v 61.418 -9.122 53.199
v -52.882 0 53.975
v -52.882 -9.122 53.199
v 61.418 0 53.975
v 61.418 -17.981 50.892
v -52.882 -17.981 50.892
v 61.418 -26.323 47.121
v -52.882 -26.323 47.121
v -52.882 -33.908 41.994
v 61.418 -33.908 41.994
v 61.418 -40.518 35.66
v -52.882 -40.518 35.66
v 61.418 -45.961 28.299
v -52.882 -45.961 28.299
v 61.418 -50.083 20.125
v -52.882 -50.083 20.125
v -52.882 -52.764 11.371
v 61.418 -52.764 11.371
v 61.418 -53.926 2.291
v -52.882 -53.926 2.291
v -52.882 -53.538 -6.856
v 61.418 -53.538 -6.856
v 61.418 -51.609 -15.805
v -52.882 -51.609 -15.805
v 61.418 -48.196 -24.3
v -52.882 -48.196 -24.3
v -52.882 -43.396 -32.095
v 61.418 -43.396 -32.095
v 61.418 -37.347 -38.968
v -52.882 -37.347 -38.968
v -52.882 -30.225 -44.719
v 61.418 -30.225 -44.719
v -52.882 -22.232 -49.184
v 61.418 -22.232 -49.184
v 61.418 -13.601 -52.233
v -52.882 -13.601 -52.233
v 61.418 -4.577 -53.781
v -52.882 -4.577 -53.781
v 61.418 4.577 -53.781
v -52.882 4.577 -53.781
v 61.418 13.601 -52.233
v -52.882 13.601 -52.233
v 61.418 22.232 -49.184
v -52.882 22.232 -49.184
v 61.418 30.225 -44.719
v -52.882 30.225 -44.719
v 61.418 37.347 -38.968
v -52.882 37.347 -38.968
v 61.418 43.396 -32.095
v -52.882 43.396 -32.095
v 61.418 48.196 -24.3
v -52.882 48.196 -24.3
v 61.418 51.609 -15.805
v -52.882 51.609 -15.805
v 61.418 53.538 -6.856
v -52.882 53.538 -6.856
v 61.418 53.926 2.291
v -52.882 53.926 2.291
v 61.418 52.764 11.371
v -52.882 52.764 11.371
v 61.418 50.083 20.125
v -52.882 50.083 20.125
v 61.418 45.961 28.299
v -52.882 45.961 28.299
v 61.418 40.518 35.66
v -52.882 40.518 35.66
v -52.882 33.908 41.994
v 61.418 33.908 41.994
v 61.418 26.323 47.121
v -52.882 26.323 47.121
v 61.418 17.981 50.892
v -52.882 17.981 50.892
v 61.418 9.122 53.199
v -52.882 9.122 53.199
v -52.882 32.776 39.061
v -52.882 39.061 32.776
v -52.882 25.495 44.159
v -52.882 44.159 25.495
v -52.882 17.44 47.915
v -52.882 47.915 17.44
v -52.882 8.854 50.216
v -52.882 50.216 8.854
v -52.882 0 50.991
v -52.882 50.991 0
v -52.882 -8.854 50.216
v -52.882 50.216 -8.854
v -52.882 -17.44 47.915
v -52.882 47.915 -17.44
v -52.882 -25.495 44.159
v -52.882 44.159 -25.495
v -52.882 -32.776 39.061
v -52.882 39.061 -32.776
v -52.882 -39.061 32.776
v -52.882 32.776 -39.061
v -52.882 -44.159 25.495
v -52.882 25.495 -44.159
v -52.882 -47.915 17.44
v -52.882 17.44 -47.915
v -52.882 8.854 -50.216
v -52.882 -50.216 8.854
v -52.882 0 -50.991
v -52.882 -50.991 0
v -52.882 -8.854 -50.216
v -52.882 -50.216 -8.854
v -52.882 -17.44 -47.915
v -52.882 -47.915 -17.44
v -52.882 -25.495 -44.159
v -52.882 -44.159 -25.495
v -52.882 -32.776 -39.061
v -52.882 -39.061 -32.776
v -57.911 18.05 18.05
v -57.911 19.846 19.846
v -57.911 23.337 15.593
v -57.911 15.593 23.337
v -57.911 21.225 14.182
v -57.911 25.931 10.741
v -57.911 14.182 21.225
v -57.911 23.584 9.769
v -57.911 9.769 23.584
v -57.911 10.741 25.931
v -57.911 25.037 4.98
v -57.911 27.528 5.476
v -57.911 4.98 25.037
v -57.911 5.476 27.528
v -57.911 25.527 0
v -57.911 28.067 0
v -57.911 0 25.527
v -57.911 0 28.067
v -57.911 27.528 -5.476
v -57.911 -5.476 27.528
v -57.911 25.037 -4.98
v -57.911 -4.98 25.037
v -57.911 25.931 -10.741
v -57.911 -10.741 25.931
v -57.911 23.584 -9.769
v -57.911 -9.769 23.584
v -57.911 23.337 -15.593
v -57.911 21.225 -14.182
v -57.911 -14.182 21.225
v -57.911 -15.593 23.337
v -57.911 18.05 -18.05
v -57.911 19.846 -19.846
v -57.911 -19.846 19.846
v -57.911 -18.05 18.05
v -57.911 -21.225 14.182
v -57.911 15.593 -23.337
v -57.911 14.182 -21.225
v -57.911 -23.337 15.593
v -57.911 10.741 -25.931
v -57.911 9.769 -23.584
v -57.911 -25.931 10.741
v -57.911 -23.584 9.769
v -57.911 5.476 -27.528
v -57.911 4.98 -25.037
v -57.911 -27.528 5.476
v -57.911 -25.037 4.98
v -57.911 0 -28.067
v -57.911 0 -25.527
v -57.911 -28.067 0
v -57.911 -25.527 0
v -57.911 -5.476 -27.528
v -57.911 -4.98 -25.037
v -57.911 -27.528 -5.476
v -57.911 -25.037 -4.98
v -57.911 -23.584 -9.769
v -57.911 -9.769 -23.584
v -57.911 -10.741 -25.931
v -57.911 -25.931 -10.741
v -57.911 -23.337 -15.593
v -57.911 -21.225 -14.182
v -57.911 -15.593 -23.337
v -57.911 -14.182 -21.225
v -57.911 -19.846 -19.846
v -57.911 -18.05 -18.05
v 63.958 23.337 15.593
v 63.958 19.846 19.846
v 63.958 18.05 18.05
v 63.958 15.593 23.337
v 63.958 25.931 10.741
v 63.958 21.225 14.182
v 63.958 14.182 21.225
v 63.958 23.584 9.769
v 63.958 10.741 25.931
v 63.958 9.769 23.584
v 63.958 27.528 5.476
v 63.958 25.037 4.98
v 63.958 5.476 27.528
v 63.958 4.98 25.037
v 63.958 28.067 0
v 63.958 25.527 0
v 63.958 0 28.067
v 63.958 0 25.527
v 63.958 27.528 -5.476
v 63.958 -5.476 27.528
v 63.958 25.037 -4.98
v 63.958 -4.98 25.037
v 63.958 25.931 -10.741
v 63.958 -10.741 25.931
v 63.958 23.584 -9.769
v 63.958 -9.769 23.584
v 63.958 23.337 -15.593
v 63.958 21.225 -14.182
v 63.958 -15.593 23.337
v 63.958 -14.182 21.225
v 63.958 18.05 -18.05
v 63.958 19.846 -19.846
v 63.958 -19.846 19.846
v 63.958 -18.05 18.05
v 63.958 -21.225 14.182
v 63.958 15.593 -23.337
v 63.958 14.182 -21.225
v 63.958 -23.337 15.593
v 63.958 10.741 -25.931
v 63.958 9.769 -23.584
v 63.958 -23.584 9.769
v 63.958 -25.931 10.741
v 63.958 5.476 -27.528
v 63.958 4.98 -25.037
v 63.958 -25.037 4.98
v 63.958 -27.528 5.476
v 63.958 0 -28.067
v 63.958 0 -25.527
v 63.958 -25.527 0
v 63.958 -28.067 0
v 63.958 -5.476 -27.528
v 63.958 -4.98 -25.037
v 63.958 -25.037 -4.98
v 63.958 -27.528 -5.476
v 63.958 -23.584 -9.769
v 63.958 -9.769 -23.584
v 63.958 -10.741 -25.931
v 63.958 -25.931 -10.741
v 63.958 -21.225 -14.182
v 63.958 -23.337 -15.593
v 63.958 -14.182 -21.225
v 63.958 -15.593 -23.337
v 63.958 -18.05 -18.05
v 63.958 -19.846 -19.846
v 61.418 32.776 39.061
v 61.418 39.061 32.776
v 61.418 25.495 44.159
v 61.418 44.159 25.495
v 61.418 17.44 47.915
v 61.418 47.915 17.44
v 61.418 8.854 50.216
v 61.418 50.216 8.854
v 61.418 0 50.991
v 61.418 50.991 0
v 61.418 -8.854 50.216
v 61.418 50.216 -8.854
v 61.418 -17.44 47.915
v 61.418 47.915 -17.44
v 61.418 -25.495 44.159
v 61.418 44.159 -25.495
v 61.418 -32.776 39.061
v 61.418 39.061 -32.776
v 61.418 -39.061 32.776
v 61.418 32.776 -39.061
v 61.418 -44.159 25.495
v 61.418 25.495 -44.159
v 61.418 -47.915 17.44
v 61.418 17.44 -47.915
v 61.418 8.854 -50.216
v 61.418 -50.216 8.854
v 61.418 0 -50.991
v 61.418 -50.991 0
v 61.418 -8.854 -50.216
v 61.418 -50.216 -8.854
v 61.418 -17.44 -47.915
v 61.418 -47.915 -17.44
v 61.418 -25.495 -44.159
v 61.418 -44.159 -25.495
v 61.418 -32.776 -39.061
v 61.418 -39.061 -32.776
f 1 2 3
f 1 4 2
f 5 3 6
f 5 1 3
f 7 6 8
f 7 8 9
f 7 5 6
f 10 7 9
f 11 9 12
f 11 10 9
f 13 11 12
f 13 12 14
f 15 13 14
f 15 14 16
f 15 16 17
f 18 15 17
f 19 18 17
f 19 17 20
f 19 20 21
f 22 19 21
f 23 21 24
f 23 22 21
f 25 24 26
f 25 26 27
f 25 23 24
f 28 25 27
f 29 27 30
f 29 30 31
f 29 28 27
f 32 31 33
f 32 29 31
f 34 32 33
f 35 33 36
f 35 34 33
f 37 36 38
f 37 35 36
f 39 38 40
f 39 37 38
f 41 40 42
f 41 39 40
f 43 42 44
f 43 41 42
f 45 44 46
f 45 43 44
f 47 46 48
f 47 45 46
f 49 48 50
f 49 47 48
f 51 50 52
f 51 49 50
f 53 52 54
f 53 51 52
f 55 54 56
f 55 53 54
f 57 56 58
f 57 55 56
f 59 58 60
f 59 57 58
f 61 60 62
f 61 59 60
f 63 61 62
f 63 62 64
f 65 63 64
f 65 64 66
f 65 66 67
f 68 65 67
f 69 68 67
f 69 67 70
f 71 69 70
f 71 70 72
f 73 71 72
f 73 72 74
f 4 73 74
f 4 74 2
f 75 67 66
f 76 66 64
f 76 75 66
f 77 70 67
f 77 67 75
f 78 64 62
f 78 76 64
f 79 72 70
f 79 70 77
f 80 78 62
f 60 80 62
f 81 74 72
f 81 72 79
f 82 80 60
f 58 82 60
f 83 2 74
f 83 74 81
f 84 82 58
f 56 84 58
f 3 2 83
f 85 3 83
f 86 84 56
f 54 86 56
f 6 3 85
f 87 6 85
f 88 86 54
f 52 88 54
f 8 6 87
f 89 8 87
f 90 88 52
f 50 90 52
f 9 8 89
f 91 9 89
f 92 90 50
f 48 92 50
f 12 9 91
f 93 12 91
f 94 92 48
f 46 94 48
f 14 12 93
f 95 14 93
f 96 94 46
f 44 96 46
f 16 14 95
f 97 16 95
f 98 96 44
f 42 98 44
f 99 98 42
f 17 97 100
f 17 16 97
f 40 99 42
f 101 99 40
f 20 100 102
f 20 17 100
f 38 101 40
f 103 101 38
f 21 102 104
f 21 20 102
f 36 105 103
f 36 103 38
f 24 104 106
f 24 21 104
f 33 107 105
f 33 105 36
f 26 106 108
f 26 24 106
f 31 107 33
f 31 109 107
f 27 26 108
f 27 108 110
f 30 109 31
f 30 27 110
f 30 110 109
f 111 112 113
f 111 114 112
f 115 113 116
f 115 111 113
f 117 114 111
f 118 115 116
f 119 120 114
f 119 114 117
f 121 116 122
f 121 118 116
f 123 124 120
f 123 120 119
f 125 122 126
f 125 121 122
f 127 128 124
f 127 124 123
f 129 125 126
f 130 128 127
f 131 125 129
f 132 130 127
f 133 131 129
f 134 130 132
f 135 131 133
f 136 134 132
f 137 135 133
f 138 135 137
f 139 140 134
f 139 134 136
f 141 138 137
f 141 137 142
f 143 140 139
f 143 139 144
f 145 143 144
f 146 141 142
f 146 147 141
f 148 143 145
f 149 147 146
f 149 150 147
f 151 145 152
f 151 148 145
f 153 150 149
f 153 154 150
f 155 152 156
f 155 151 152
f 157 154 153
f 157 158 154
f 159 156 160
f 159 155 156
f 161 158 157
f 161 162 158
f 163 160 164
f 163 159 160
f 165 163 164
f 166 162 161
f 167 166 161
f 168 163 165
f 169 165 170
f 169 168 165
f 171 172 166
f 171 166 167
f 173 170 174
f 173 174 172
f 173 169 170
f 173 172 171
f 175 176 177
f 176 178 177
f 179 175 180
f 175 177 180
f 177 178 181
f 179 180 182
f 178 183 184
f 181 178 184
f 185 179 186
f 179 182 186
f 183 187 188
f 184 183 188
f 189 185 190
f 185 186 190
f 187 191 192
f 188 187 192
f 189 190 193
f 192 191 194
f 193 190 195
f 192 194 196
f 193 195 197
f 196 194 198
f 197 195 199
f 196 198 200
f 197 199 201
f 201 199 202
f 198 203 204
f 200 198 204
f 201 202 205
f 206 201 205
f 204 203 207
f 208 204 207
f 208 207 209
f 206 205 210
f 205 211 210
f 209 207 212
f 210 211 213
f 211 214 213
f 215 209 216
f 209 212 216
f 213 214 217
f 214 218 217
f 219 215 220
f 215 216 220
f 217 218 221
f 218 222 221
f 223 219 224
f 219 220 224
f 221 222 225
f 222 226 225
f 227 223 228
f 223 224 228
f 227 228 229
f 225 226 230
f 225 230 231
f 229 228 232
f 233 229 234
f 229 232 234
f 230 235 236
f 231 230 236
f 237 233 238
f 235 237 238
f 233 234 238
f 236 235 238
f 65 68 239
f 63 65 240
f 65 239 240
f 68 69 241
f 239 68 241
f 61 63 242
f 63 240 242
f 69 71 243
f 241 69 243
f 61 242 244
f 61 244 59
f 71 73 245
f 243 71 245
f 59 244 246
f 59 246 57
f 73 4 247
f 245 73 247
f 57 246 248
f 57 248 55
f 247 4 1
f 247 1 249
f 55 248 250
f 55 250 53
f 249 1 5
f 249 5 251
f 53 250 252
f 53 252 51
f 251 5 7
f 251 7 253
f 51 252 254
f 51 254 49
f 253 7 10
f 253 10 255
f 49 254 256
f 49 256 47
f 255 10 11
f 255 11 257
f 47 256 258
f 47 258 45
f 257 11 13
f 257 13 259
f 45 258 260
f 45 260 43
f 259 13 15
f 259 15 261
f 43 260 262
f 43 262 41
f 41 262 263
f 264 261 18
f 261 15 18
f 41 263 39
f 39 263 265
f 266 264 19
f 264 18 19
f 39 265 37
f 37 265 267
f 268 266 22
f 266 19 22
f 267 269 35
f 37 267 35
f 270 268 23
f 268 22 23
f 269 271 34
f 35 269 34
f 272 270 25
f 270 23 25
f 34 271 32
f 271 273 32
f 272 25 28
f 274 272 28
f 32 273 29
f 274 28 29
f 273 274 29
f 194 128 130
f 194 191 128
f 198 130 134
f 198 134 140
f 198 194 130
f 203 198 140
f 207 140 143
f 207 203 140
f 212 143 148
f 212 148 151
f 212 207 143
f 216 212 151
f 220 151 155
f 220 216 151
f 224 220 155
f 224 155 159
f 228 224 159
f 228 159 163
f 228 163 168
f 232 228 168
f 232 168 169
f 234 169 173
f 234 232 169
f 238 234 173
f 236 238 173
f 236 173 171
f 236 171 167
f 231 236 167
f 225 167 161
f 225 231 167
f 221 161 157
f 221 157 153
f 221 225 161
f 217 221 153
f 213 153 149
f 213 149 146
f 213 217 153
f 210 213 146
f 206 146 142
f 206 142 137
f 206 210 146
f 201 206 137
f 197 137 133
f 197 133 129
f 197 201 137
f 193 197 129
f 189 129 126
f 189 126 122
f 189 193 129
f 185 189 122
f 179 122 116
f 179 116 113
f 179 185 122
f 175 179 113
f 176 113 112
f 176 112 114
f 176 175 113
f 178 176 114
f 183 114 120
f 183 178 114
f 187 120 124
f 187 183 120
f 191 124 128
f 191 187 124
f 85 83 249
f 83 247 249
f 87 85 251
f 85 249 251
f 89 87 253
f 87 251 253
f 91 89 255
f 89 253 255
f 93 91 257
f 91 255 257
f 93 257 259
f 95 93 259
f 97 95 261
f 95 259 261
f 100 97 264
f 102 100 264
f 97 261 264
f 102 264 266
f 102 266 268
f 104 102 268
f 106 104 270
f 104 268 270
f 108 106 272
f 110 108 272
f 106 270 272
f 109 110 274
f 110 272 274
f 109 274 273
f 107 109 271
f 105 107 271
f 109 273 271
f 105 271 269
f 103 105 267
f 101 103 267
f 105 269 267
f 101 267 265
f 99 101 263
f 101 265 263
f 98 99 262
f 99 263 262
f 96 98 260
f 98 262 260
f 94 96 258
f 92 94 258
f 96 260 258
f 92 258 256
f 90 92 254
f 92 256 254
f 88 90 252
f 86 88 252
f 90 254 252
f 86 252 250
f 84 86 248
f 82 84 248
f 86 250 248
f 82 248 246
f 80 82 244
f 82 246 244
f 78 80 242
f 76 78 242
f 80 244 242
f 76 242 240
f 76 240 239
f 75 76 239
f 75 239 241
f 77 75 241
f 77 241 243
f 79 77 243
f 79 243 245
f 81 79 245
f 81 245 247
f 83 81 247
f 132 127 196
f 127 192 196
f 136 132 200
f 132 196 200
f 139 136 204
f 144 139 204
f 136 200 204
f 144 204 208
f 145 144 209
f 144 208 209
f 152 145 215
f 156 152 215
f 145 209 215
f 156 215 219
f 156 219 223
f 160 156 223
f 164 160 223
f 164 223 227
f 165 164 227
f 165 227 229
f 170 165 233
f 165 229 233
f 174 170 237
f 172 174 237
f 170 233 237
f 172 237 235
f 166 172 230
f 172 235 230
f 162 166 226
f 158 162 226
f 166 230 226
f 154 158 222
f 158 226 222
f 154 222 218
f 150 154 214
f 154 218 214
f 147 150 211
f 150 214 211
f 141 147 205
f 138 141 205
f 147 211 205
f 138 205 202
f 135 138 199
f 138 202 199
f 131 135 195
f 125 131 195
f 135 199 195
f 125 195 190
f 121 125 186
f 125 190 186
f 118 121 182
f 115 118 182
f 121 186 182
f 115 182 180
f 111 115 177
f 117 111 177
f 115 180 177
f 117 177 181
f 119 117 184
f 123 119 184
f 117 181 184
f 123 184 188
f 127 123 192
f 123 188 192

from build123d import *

# Parameters (mm, degrees)
SKETCH2_W   = 121.8692
SKETCH2_H   = 2.54
SKETCH2_W_2 = 114.3
SKETCH2_H_2 = 2.9845


with BuildPart() as part:
    # Sketch2 → Revolve1 (revolve)
    with BuildSketch(Plane.XY, mode=Mode.PRIVATE) as revolve1_sk:
        with Locations((3.023472735, 26.797)):
            Rectangle(SKETCH2_W, SKETCH2_H)
        with Locations((4.268072735, 52.48275)):
            Rectangle(SKETCH2_W_2, SKETCH2_H_2)
    revolve(revolve1_sk.sketch.rotate(Axis((0, 0, 0), (1, 0, 0)), 90), axis=Axis((0, 0, 0), (1, 0, 0)))


solid = part.part
